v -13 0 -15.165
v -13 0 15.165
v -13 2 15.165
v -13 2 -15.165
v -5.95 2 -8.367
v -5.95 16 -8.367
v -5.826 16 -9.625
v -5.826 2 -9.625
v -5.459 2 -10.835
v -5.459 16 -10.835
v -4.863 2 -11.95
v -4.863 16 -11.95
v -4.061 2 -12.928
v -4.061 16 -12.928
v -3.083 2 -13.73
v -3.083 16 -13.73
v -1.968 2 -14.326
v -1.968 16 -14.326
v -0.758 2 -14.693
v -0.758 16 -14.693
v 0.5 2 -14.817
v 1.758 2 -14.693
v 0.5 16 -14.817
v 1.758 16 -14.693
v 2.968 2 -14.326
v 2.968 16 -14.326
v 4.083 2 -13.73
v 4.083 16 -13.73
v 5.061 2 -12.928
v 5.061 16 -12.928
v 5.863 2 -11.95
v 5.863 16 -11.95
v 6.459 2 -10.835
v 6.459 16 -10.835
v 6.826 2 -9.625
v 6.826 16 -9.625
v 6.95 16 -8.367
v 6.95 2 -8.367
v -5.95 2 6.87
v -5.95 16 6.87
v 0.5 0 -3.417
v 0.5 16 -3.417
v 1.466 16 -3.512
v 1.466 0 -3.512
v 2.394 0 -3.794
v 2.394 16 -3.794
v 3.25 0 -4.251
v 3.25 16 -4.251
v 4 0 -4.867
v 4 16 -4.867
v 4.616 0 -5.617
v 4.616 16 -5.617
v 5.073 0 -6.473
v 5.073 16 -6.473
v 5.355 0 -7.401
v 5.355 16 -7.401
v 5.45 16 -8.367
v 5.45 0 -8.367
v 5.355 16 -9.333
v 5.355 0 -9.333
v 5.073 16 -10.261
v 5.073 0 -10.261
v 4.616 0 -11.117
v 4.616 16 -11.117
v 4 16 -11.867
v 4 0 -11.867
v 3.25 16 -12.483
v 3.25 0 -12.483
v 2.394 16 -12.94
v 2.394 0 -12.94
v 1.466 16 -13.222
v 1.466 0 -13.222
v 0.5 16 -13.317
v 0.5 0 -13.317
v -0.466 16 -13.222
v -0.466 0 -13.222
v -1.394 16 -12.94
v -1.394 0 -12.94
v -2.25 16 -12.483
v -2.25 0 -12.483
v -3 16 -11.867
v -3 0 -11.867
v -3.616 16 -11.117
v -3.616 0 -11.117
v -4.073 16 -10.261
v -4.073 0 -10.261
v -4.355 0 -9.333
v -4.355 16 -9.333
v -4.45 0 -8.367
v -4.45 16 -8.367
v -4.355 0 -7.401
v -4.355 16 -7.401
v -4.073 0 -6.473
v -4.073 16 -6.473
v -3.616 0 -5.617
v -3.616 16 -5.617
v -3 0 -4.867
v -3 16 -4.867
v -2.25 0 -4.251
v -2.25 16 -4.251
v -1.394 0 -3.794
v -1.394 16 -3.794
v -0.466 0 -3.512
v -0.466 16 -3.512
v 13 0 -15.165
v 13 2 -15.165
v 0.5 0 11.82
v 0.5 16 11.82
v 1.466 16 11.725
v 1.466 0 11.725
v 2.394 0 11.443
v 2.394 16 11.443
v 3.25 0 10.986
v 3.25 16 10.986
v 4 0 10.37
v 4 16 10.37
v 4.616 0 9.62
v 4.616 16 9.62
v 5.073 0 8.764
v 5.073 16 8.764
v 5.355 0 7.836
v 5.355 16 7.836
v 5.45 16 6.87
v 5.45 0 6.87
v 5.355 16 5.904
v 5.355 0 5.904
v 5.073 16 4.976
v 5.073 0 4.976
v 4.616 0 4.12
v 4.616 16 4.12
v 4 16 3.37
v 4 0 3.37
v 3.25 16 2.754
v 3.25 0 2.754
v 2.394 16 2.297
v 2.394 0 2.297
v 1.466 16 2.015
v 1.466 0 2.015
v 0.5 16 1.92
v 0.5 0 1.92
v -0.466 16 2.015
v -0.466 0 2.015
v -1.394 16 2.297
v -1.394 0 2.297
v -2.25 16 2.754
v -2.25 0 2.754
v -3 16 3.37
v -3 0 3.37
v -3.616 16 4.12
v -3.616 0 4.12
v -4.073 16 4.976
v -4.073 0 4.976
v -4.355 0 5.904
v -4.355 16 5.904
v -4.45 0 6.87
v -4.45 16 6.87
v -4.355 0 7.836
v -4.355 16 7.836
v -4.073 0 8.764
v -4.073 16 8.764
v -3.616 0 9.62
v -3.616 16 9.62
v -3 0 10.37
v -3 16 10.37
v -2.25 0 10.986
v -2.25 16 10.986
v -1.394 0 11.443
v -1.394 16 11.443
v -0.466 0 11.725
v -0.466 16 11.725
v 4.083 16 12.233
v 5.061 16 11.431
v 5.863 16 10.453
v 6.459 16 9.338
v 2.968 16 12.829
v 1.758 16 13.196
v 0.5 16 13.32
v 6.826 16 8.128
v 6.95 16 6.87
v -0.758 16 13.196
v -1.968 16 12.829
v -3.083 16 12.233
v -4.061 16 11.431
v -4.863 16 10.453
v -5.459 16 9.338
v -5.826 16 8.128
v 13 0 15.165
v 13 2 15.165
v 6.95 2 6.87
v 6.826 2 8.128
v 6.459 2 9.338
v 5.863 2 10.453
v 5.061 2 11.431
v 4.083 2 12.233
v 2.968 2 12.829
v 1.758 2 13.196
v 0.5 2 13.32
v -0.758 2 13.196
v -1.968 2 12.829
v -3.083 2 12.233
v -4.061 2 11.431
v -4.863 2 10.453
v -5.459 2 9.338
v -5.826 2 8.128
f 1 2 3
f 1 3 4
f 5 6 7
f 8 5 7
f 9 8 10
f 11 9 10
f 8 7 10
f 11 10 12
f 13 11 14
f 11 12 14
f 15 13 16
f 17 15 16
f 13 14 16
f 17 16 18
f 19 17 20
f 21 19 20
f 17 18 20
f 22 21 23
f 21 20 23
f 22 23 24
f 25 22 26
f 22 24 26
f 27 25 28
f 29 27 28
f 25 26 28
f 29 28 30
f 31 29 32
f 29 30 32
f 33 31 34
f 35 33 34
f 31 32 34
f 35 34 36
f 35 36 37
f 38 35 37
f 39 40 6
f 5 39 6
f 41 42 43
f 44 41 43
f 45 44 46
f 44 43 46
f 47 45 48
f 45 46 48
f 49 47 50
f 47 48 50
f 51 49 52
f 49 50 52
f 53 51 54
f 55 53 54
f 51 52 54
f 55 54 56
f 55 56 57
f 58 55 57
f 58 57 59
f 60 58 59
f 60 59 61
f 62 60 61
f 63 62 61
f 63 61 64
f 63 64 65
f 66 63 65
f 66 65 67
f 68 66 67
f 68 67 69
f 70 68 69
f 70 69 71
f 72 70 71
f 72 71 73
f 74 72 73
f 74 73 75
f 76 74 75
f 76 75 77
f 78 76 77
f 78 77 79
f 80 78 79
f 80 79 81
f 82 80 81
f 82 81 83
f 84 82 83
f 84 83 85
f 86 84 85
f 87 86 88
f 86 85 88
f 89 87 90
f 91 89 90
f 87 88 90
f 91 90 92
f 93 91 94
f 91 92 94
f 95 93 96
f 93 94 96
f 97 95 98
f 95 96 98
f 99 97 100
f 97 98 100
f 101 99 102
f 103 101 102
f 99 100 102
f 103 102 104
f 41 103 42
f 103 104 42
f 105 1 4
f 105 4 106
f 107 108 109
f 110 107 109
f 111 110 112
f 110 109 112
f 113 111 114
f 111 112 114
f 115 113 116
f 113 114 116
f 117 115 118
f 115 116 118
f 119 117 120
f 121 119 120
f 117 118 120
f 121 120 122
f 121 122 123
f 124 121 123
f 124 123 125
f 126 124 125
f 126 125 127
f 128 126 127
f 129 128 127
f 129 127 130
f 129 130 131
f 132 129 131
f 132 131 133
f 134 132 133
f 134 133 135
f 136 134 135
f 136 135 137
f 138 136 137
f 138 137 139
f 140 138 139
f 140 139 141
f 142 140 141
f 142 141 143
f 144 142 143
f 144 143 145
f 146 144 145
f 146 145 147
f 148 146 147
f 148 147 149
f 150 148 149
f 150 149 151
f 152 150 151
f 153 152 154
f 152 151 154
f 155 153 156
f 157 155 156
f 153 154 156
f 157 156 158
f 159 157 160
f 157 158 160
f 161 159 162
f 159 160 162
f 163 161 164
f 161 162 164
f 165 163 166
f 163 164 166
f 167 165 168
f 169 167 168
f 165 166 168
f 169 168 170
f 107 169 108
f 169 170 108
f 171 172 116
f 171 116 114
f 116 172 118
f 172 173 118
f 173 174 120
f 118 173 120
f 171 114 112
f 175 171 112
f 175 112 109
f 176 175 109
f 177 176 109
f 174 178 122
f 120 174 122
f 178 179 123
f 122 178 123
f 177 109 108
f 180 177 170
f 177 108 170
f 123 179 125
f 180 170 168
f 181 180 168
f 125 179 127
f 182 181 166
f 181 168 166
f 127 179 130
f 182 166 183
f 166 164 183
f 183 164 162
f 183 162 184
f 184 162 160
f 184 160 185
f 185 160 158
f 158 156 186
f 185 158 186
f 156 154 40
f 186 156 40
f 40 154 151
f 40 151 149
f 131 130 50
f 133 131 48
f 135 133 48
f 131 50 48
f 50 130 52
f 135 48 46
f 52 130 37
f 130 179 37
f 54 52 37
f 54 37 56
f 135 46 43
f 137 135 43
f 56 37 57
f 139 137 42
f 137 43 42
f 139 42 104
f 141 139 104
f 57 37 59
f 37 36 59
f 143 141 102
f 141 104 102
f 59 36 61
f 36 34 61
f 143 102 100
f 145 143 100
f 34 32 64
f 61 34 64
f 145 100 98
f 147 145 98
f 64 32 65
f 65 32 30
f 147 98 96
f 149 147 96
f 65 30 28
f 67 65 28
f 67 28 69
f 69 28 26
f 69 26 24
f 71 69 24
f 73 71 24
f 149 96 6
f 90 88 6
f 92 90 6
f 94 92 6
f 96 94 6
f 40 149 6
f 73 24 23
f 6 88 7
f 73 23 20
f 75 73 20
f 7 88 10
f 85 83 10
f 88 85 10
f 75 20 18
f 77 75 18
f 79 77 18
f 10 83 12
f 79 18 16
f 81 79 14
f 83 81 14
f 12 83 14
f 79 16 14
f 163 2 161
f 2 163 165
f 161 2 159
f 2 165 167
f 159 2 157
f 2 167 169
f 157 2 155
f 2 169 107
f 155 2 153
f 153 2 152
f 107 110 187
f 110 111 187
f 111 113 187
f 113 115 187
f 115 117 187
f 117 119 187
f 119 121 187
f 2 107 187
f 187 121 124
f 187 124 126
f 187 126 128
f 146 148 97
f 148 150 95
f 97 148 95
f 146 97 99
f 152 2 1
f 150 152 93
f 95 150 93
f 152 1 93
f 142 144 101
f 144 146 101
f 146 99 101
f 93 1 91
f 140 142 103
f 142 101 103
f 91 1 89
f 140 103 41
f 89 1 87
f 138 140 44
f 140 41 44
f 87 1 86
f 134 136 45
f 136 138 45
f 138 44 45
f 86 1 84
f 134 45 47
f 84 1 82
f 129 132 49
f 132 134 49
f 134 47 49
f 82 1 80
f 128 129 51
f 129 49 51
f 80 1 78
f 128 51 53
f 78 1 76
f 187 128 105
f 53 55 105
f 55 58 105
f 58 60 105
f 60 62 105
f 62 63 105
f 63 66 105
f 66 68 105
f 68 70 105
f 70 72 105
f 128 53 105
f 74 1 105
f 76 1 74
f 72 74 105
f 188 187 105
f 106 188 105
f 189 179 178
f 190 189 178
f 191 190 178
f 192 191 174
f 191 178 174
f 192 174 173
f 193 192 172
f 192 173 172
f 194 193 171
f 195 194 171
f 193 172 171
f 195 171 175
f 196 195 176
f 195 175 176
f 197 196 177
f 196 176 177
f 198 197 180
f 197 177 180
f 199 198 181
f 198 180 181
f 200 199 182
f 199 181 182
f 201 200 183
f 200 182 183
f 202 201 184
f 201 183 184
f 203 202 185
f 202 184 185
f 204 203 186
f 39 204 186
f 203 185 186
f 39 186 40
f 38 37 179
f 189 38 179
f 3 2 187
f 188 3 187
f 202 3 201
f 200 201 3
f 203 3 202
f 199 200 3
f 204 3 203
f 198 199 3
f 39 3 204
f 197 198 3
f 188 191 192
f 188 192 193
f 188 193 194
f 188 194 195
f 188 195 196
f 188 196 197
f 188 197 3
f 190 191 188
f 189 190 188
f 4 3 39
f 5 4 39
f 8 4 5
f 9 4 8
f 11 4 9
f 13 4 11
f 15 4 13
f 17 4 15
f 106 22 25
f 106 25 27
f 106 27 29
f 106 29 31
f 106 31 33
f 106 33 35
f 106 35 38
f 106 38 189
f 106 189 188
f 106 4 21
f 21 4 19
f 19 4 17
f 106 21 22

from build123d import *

# Parameters (mm, degrees)
SKETCH_1_W          = 26
SKETCH_1_H          = 30.33
EXTRUDE_1_DEPTH     = 2
SKETCH_2_R          = 4.95
CUT_EXTRUDE_1_DEPTH = 21.07429264
EXTRUDE_START       = 14
SKETCH_3_R          = 4.95
EXTRUDE_2_DEPTH     = 14


with BuildPart() as part:
    # Эскиз1 → Бобышка-Вытянуть1 (new body)
    with BuildSketch(Plane(origin=(0, 0, 0), x_dir=(1, 0, 0), z_dir=(0, 1, 0))):
        Rectangle(SKETCH_1_W, SKETCH_1_H)
    extrude(amount=EXTRUDE_1_DEPTH)

    # Эскиз2 → Вырез-Вытянуть1 (cut, through all)
    with BuildSketch(Plane(origin=(0, 2, 0), x_dir=(1, 0, 0), z_dir=(0, 1, 0))):
        with Locations(Location((0.5, -6.870000865, 0), (0, 0, 270))):
            Circle(SKETCH_2_R)
        with Locations(Location((0.5, 8.367040316, 0), (0, 0, 270))):
            Circle(SKETCH_2_R)
    extrude(amount=-CUT_EXTRUDE_1_DEPTH, mode=Mode.SUBTRACT)

    # Эскиз3 → Бобышка-Вытянуть2 (add)
    with BuildSketch(Plane(origin=(0, 2, 0), x_dir=(1, 0, 0), z_dir=(0, 1, 0)).offset(EXTRUDE_START)):
        with BuildLine():
            Line((-5.95, -6.870000865), (-5.95, 8.367040316))
            ThreePointArc((-5.95, 8.367040316), (0.5, 14.817040316), (6.95, 8.367040316))
            Line((6.95, 8.367040316), (6.95, -6.870000865))
            ThreePointArc((6.95, -6.870000865), (0.5, -13.320000865), (-5.95, -6.870000865))
        make_face()
        with Locations(Location((0.5, -6.870000865, 0), (0, 0, 270))):
            Circle(SKETCH_3_R, mode=Mode.SUBTRACT)
        with Locations(Location((0.5, 8.367040316, 0), (0, 0, 270))):
            Circle(SKETCH_3_R, mode=Mode.SUBTRACT)
    extrude(amount=-EXTRUDE_2_DEPTH)


solid = part.part
